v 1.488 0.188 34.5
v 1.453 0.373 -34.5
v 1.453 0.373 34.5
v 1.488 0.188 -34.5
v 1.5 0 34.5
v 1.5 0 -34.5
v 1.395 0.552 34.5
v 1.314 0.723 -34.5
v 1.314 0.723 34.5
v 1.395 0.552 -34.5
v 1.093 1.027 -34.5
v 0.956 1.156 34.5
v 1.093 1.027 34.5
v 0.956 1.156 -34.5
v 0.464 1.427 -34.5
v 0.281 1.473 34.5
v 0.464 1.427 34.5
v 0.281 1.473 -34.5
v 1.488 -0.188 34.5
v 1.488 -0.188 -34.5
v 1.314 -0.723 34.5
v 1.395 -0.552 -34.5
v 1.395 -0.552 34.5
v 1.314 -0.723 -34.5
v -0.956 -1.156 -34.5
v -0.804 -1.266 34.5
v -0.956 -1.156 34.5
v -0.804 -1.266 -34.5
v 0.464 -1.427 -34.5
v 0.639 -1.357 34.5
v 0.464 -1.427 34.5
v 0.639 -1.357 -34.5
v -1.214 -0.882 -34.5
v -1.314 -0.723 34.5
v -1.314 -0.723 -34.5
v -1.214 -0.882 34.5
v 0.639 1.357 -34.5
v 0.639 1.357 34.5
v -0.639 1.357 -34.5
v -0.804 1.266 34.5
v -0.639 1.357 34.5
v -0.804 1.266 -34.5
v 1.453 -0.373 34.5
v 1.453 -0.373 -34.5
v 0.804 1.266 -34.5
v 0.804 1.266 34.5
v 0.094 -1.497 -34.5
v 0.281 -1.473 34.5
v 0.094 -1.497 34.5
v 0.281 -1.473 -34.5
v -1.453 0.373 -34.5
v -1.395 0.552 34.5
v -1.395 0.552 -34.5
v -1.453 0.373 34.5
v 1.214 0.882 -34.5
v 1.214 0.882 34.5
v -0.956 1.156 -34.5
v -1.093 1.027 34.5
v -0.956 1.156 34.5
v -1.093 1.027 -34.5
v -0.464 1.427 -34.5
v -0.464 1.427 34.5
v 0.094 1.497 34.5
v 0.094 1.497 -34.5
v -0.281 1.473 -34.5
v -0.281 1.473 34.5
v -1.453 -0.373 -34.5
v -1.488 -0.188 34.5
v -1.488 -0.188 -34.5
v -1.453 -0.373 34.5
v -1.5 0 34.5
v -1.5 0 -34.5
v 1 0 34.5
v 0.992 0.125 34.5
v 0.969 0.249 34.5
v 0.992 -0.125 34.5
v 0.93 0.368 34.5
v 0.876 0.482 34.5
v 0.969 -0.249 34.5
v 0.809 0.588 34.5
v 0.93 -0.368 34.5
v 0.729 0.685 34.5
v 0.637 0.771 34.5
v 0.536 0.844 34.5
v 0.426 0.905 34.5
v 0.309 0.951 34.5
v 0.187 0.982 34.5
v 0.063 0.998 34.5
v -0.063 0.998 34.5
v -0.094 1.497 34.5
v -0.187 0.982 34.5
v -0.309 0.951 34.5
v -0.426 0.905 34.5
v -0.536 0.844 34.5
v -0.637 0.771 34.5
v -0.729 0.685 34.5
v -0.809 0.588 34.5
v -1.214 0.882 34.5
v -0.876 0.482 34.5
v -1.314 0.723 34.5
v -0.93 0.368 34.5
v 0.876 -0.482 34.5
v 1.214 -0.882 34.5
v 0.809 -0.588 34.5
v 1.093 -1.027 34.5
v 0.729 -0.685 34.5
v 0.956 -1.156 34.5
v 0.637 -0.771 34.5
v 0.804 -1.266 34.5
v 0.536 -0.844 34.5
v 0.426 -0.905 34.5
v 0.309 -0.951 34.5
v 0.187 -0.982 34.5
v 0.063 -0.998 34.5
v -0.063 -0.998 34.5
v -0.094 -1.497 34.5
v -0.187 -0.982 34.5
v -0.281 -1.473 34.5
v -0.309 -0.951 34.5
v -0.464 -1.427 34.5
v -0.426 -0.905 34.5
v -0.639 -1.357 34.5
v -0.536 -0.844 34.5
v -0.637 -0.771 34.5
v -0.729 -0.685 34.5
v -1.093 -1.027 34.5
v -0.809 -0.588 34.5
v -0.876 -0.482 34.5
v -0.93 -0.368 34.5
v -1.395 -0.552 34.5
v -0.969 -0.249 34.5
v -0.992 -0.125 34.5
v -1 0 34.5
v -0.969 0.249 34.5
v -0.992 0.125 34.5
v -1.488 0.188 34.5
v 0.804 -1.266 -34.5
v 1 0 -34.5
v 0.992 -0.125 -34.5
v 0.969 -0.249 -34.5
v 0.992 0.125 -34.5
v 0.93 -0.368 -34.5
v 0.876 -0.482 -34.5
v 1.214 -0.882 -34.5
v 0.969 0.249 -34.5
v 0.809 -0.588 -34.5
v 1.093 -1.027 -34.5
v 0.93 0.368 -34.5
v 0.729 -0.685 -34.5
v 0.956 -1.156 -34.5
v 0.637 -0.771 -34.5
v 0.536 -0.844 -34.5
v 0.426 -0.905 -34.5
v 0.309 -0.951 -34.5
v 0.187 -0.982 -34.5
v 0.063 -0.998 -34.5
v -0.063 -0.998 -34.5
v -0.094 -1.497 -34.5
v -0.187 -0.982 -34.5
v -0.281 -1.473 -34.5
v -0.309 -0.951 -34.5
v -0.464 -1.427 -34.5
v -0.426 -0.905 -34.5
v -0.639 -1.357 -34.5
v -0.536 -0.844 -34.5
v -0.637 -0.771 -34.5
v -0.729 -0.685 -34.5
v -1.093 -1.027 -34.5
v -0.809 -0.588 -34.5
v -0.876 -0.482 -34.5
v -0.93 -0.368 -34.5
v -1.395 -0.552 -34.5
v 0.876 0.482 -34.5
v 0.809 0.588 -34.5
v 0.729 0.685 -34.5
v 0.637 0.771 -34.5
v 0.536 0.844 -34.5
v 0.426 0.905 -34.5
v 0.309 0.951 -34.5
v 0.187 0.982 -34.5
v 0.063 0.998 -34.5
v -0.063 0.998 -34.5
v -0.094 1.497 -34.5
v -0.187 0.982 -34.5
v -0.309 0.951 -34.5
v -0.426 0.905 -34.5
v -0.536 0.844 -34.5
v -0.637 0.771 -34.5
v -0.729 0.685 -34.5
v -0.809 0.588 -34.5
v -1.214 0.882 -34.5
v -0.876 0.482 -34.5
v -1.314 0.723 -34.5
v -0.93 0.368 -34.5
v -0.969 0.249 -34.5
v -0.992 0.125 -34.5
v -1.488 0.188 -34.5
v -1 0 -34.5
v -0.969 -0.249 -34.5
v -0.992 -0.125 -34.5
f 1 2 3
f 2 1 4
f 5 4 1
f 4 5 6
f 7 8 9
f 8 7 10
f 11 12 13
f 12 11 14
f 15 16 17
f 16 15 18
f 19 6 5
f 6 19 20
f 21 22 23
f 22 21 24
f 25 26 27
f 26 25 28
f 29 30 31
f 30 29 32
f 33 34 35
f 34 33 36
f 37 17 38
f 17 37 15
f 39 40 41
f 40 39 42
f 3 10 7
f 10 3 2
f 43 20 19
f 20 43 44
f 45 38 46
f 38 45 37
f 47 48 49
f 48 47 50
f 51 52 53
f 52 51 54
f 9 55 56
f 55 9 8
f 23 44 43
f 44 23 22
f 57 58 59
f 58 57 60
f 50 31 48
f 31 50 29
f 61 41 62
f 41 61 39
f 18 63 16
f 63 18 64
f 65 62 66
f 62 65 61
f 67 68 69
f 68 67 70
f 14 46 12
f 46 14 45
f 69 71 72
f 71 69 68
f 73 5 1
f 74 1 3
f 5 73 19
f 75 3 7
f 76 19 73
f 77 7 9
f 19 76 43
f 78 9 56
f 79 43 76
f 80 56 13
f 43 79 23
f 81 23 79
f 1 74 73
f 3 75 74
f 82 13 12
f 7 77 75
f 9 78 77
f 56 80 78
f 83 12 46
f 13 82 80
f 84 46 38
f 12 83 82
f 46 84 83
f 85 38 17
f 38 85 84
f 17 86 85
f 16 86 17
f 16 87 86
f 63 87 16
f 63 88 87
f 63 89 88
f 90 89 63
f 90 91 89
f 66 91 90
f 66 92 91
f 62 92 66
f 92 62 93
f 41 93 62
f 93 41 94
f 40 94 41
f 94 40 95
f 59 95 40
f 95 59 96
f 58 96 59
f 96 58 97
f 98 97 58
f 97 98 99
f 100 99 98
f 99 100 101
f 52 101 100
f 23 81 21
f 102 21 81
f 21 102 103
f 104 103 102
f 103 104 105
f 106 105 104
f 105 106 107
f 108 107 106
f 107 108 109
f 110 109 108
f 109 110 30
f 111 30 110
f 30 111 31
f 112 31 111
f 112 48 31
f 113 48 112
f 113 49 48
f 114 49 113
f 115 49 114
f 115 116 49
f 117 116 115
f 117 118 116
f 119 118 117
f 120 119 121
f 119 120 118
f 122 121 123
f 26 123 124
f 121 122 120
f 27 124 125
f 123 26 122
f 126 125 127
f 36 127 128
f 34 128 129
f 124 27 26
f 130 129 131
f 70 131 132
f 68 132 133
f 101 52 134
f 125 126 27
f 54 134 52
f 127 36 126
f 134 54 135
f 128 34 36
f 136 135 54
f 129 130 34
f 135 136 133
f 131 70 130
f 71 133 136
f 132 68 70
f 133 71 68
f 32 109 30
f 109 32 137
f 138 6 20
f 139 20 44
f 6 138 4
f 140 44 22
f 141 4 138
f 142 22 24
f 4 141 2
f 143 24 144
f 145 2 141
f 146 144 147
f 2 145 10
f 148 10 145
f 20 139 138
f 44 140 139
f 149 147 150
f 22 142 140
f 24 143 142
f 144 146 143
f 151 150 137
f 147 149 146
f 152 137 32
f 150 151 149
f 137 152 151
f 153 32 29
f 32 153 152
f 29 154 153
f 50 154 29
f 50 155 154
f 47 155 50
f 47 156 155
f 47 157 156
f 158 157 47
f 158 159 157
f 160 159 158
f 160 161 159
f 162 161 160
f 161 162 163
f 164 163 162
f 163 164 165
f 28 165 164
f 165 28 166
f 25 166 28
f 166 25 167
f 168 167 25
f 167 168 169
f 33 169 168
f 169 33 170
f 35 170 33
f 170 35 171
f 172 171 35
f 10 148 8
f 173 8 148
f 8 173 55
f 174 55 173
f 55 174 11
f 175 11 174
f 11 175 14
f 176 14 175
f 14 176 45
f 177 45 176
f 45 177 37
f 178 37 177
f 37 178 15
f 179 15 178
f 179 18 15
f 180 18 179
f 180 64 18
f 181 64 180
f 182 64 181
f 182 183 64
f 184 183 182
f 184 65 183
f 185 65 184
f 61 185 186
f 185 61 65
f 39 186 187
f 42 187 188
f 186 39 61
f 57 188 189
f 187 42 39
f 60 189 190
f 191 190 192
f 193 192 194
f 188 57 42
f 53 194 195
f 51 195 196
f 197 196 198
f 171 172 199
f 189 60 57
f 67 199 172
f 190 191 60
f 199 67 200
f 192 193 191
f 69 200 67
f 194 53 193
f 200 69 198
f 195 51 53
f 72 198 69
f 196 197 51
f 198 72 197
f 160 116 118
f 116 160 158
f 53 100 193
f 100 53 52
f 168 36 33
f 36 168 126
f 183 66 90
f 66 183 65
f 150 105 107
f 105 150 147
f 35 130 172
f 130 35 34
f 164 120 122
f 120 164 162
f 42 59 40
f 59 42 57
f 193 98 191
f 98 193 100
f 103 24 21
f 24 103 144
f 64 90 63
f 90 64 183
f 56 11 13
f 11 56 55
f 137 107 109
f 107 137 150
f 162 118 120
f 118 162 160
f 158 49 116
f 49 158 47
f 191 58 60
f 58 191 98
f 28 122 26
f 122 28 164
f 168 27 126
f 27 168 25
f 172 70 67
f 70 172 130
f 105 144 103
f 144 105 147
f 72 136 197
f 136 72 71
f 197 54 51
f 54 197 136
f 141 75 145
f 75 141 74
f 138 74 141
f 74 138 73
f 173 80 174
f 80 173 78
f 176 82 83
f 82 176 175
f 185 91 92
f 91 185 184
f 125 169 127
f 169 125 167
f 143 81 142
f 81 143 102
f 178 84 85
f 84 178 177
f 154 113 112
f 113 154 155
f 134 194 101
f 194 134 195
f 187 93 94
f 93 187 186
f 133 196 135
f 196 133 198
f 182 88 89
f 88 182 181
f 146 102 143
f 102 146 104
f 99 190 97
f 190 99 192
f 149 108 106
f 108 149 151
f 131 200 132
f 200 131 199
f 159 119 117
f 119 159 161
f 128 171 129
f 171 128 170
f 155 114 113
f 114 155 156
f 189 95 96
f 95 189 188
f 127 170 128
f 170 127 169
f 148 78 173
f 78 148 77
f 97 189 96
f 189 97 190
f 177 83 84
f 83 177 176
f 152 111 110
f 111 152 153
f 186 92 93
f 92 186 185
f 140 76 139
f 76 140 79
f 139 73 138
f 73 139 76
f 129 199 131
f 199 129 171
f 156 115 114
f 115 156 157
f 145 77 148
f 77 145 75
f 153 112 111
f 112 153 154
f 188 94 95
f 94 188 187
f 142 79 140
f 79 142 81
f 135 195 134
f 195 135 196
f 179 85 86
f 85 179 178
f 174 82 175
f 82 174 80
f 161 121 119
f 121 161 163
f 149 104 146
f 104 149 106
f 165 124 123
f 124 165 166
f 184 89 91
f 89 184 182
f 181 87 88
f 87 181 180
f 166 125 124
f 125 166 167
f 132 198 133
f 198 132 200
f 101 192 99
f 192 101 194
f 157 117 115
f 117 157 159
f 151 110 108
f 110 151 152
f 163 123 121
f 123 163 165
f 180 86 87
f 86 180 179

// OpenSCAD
$fn = 50;


difference() {
	union() {
		translate(v = [0, 0, -34.5000000000]) {
			cylinder(h = 69, r = 1.5000000000);
		}
	}
	union() {
		translate(v = [0, 0, -100.0000000000]) {
			cylinder(h = 200, r = 1.0000000000);
		}
	}
}
